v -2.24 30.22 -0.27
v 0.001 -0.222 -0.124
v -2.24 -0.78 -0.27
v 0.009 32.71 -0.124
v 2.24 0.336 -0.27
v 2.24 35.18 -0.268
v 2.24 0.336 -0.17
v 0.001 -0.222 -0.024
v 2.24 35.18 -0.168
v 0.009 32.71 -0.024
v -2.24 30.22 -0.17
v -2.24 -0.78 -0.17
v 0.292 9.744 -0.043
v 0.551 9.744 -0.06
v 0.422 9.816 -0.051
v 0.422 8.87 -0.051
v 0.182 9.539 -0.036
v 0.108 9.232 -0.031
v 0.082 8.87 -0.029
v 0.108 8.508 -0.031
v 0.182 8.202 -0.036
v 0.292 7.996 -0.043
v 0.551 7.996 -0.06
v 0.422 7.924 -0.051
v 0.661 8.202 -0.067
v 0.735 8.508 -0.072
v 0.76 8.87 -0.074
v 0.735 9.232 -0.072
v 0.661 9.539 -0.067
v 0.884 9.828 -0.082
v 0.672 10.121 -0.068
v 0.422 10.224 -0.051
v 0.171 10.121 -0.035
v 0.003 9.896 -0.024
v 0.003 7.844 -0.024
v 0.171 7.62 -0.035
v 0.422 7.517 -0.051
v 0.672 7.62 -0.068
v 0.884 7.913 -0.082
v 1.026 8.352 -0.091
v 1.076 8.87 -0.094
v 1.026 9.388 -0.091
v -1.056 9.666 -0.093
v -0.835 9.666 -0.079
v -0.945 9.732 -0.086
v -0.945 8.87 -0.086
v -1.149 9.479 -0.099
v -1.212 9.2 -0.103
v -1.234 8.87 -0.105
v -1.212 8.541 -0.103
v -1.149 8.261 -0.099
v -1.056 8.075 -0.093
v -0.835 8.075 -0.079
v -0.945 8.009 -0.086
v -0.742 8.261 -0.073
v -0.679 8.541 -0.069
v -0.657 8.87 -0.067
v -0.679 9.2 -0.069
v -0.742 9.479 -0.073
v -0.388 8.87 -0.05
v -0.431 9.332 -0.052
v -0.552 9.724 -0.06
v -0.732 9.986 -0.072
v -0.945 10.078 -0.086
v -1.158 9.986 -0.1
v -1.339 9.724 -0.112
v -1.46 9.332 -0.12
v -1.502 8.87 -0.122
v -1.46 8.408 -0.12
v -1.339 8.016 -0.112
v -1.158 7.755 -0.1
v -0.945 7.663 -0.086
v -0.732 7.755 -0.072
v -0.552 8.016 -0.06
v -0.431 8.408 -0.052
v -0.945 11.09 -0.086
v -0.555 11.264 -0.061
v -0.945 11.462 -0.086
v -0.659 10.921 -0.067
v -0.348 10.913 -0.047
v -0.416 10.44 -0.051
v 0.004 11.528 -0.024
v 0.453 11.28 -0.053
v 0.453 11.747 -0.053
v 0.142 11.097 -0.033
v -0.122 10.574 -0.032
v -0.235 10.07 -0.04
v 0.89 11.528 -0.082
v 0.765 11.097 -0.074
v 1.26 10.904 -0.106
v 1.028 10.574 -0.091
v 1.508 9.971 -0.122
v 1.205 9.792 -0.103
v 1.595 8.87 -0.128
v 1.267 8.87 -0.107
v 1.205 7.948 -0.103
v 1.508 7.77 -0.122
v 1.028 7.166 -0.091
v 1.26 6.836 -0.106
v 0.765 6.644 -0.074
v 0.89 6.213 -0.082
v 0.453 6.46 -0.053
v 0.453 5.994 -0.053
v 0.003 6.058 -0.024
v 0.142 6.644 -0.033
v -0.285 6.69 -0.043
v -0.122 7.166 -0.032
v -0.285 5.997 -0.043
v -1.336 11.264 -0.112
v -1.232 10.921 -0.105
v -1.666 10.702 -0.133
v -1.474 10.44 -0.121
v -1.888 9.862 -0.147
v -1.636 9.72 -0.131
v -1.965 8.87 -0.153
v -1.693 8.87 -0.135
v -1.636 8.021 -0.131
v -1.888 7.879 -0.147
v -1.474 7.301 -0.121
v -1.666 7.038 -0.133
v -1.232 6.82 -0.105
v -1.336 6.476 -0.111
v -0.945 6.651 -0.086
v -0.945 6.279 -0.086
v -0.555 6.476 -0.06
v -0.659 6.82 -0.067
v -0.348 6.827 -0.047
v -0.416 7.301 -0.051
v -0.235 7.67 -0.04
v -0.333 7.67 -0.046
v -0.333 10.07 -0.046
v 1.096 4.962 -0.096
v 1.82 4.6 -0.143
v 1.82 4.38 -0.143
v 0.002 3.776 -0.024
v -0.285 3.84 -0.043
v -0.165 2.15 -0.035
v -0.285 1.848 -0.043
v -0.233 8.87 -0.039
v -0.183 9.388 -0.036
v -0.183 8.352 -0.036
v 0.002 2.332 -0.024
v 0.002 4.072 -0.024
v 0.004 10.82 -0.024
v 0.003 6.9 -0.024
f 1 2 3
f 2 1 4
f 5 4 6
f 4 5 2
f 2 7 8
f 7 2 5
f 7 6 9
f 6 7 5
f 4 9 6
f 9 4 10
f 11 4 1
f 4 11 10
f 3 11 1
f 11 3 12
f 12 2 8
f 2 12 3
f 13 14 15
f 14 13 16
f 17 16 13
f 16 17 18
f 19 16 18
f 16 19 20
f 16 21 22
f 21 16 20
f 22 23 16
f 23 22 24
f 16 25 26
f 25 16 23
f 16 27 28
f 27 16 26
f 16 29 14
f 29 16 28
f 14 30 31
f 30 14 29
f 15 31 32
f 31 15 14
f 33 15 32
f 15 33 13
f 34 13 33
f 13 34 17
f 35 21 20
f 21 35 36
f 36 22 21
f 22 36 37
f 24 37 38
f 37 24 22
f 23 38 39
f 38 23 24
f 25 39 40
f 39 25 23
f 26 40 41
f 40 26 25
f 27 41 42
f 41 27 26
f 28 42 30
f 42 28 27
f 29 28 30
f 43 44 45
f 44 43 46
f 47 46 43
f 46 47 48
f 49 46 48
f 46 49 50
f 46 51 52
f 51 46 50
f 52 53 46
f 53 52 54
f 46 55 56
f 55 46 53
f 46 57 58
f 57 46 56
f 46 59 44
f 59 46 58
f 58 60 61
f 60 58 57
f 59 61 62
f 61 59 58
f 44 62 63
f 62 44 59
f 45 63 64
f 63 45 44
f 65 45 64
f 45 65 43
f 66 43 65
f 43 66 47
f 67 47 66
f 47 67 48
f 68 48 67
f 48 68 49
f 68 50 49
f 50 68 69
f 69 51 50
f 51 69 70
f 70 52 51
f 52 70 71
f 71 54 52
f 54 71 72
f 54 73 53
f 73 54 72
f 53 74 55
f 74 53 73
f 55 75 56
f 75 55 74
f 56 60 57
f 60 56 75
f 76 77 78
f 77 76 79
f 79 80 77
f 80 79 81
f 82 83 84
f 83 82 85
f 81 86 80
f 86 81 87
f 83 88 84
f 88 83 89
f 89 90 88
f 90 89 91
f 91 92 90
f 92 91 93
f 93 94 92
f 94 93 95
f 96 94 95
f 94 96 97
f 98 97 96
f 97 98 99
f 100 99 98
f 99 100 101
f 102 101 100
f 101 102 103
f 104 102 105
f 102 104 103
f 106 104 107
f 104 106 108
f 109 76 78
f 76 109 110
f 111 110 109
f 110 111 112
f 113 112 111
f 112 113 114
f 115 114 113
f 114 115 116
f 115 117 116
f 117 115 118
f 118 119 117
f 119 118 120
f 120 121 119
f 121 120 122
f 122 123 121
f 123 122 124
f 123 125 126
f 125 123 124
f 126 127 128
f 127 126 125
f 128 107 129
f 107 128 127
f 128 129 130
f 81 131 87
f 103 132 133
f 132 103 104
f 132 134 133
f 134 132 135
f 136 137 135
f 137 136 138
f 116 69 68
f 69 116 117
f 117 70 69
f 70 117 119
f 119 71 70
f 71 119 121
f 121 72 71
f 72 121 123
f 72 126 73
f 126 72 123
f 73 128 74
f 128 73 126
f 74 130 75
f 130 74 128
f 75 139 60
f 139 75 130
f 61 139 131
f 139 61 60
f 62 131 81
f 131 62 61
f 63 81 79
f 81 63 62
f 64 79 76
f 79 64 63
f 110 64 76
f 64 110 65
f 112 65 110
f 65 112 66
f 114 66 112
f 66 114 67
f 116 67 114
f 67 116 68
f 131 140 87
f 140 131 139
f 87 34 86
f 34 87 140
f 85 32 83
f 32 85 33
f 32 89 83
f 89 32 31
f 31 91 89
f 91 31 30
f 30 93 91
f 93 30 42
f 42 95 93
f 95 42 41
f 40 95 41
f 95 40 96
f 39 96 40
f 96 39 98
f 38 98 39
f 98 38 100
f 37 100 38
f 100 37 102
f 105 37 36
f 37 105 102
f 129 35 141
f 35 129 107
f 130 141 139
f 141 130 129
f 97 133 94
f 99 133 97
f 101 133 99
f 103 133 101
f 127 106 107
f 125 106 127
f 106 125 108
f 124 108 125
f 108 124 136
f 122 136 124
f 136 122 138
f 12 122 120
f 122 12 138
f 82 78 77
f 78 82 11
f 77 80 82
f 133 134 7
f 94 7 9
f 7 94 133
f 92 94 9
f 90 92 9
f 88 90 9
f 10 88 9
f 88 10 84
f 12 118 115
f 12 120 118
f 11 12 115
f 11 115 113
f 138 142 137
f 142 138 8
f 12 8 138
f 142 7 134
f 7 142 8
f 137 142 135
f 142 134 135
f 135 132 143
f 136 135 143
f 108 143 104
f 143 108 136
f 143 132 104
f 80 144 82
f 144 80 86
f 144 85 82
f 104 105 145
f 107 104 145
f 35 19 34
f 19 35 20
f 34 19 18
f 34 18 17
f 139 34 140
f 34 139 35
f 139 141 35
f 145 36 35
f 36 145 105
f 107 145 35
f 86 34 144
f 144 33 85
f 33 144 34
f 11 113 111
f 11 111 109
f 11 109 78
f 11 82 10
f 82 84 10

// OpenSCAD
use <../lib.scad>
function ldraw_lib__4125165fc01() = [
// 0 Sticker  0.6 x  4.5 Trapezoid with White "v8" on Left Side on Red Background (Formed)
// 0 Name: 4125165fc01.dat
// 0 Author: Philippe Hurbain [Philo]
// 0 !LDRAW_ORG Part UPDATE 2019-03
// 0 !LICENSE Licensed under CC BY 4.0 : see CAreadme.txt
// 
// 0 BFC CERTIFY CCW
  [0,"BFC","CERTIFY"],
  [0,"BFC","CCW"],
// 
// 0 !KEYWORDS Set 8448
// 
// 0 !HISTORY 2019-12-27 [PTadmin] Official Update 2019-03
// 
// 
// 4 16 -5.6 0.6762 -1.95 -5.6 0.6755 75.55 0.0228 0.3101 81.7753 0.0023 0.31 -0.5544
  [4,16,-5.6,0.6762,-1.95,-5.6,0.6755,75.55,0.0228,0.3101,81.7753,0.0023,0.31,-0.5544],
// 4 16 5.6 0.6762 0.84 0.0023 0.31 -0.5544 0.0228 0.3101 81.7753 5.6 0.6712 87.95
  [4,16,5.6,0.6762,0.84,0.0023,0.31,-0.5544,0.0228,0.3101,81.7753,5.6,0.6712,87.95],
// 
// 4 16 0.0023 0.31 -0.5544 5.6 0.6762 0.84 5.6 0.4262 0.84 0.0024 0.06 -0.5544
  [4,16,0.0023,0.31,-0.5544,5.6,0.6762,0.84,5.6,0.4262,0.84,0.0024,0.06,-0.5544],
// 4 16 5.6 0.6762 0.84 5.6 0.6712 87.95 5.6 0.4212 87.95 5.6 0.4262 0.84
  [4,16,5.6,0.6762,0.84,5.6,0.6712,87.95,5.6,0.4212,87.95,5.6,0.4262,0.84],
// 4 16 5.6 0.6712 87.95 0.0228 0.3101 81.7753 0.0228 0.0601 81.7753 5.6 0.4212 87.95
  [4,16,5.6,0.6712,87.95,0.0228,0.3101,81.7753,0.0228,0.0601,81.7753,5.6,0.4212,87.95],
// 4 16 0.0228 0.3101 81.7753 -5.6 0.6755 75.55 -5.6 0.4255 75.55 0.0228 0.0601 81.7753
  [4,16,0.0228,0.3101,81.7753,-5.6,0.6755,75.55,-5.6,0.4255,75.55,0.0228,0.0601,81.7753],
// 4 16 -5.6 0.6755 75.55 -5.6 0.6762 -1.95 -5.6 0.4262 -1.95 -5.6 0.4255 75.55
  [4,16,-5.6,0.6755,75.55,-5.6,0.6762,-1.95,-5.6,0.4262,-1.95,-5.6,0.4255,75.55],
// 4 16 -5.6 0.6762 -1.95 0.0023 0.31 -0.5544 0.0024 0.06 -0.5544 -5.6 0.4262 -1.95
  [4,16,-5.6,0.6762,-1.95,0.0023,0.31,-0.5544,0.0024,0.06,-0.5544,-5.6,0.4262,-1.95],
// 
// 4 4 1.054 0.1285 22.176 1.378 0.1496 24.36 1.054 0.1284 24.54 0.729 0.1072 24.36
  [4,4,1.054,0.1285,22.176,1.378,0.1496,24.36,1.054,0.1284,24.54,0.729,0.1072,24.36],
// 4 4 1.054 0.1285 22.176 0.729 0.1072 24.36 0.454 0.0892 23.848 0.271 0.0772 23.081
  [4,4,1.054,0.1285,22.176,0.729,0.1072,24.36,0.454,0.0892,23.848,0.271,0.0772,23.081],
// 4 4 1.054 0.1285 22.176 0.271 0.0772 23.081 0.206 0.073 22.176 0.271 0.0773 21.271
  [4,4,1.054,0.1285,22.176,0.271,0.0772,23.081,0.206,0.073,22.176,0.271,0.0773,21.271],
// 4 4 1.054 0.1285 22.176 0.271 0.0773 21.271 0.454 0.0892 20.504 0.729 0.1072 19.991
  [4,4,1.054,0.1285,22.176,0.271,0.0773,21.271,0.454,0.0892,20.504,0.729,0.1072,19.991],
// 4 4 1.054 0.1285 22.176 0.729 0.1072 19.991 1.054 0.1285 19.811 1.378 0.1497 19.991
  [4,4,1.054,0.1285,22.176,0.729,0.1072,19.991,1.054,0.1285,19.811,1.378,0.1497,19.991],
// 4 4 1.054 0.1285 22.176 1.378 0.1497 19.991 1.653 0.1677 20.504 1.837 0.1797 21.271
  [4,4,1.054,0.1285,22.176,1.378,0.1497,19.991,1.653,0.1677,20.504,1.837,0.1797,21.271],
// 4 4 1.054 0.1285 22.176 1.837 0.1797 21.271 1.901 0.1839 22.176 1.837 0.1797 23.081
  [4,4,1.054,0.1285,22.176,1.837,0.1797,21.271,1.901,0.1839,22.176,1.837,0.1797,23.081],
// 4 4 1.054 0.1285 22.176 1.837 0.1797 23.081 1.653 0.1676 23.848 1.378 0.1496 24.36
  [4,4,1.054,0.1285,22.176,1.837,0.1797,23.081,1.653,0.1676,23.848,1.378,0.1496,24.36],
// 4 15 1.653 0.1676 23.848 2.21 0.2041 24.569 1.68 0.1694 25.302 1.378 0.1496 24.36
  [4,15,1.653,0.1676,23.848,2.21,0.2041,24.569,1.68,0.1694,25.302,1.378,0.1496,24.36],
// 4 15 1.378 0.1496 24.36 1.68 0.1694 25.302 1.054 0.1284 25.56 1.054 0.1284 24.54
  [4,15,1.378,0.1496,24.36,1.68,0.1694,25.302,1.054,0.1284,25.56,1.054,0.1284,24.54],
// 4 15 1.054 0.1284 24.54 1.054 0.1284 25.56 0.428 0.0875 25.302 0.729 0.1072 24.36
  [4,15,1.054,0.1284,24.54,1.054,0.1284,25.56,0.428,0.0875,25.302,0.729,0.1072,24.36],
// 4 15 0.729 0.1072 24.36 0.428 0.0875 25.302 0.0086 0.06 24.74 0.454 0.0892 23.848
  [4,15,0.729,0.1072,24.36,0.428,0.0875,25.302,0.0086,0.06,24.74,0.454,0.0892,23.848],
// 4 15 0.454 0.0892 20.504 0.271 0.0773 21.271 0.0074 0.06 19.61 0.428 0.0876 19.049
  [4,15,0.454,0.0892,20.504,0.271,0.0773,21.271,0.0074,0.06,19.61,0.428,0.0876,19.049],
// 4 15 0.729 0.1072 19.991 0.454 0.0892 20.504 0.428 0.0876 19.049 1.054 0.1285 18.792
  [4,15,0.729,0.1072,19.991,0.454,0.0892,20.504,0.428,0.0876,19.049,1.054,0.1285,18.792],
// 4 15 1.054 0.1285 19.811 0.729 0.1072 19.991 1.054 0.1285 18.792 1.68 0.1695 19.049
  [4,15,1.054,0.1285,19.811,0.729,0.1072,19.991,1.054,0.1285,18.792,1.68,0.1695,19.049],
// 4 15 1.378 0.1497 19.991 1.054 0.1285 19.811 1.68 0.1695 19.049 2.21 0.2041 19.783
  [4,15,1.378,0.1497,19.991,1.054,0.1285,19.811,1.68,0.1695,19.049,2.21,0.2041,19.783],
// 4 15 1.653 0.1677 20.504 1.378 0.1497 19.991 2.21 0.2041 19.783 2.565 0.2273 20.881
  [4,15,1.653,0.1677,20.504,1.378,0.1497,19.991,2.21,0.2041,19.783,2.565,0.2273,20.881],
// 4 15 1.837 0.1797 21.271 1.653 0.1677 20.504 2.565 0.2273 20.881 2.689 0.2354 22.176
  [4,15,1.837,0.1797,21.271,1.653,0.1677,20.504,2.565,0.2273,20.881,2.689,0.2354,22.176],
// 4 15 1.901 0.1839 22.176 1.837 0.1797 21.271 2.689 0.2354 22.176 2.565 0.2273 23.471
  [4,15,1.901,0.1839,22.176,1.837,0.1797,21.271,2.689,0.2354,22.176,2.565,0.2273,23.471],
// 4 15 1.837 0.1797 23.081 1.901 0.1839 22.176 2.565 0.2273 23.471 2.21 0.2041 24.569
  [4,15,1.837,0.1797,23.081,1.901,0.1839,22.176,2.565,0.2273,23.471,2.21,0.2041,24.569],
// 3 15 1.653 0.1676 23.848 1.837 0.1797 23.081 2.21 0.2041 24.569
  [3,15,1.653,0.1676,23.848,1.837,0.1797,23.081,2.21,0.2041,24.569],
// 4 4 -2.363 0.215 22.176 -2.087 0.197 24.165 -2.363 0.2151 24.329 -2.639 0.2331 24.165
  [4,4,-2.363,0.215,22.176,-2.087,0.197,24.165,-2.363,0.2151,24.329,-2.639,0.2331,24.165],
// 4 4 -2.363 0.215 22.176 -2.639 0.2331 24.165 -2.873 0.2484 23.698 -3.029 0.2586 23
  [4,4,-2.363,0.215,22.176,-2.639,0.2331,24.165,-2.873,0.2484,23.698,-3.029,0.2586,23],
// 4 4 -2.363 0.215 22.176 -3.029 0.2586 23 -3.084 0.2621 22.176 -3.029 0.2585 21.352
  [4,4,-2.363,0.215,22.176,-3.029,0.2586,23,-3.084,0.2621,22.176,-3.029,0.2585,21.352],
// 4 4 -2.363 0.215 22.176 -3.029 0.2585 21.352 -2.873 0.2483 20.653 -2.639 0.233 20.187
  [4,4,-2.363,0.215,22.176,-3.029,0.2585,21.352,-2.873,0.2483,20.653,-2.639,0.233,20.187],
// 4 4 -2.363 0.215 22.176 -2.639 0.233 20.187 -2.363 0.215 20.023 -2.087 0.1969 20.187
  [4,4,-2.363,0.215,22.176,-2.639,0.233,20.187,-2.363,0.215,20.023,-2.087,0.1969,20.187],
// 4 4 -2.363 0.215 22.176 -2.087 0.1969 20.187 -1.854 0.1817 20.653 -1.697 0.1715 21.352
  [4,4,-2.363,0.215,22.176,-2.087,0.1969,20.187,-1.854,0.1817,20.653,-1.697,0.1715,21.352],
// 4 4 -2.363 0.215 22.176 -1.697 0.1715 21.352 -1.643 0.168 22.176 -1.697 0.1715 23
  [4,4,-2.363,0.215,22.176,-1.697,0.1715,21.352,-1.643,0.168,22.176,-1.697,0.1715,23],
// 4 4 -2.363 0.215 22.176 -1.697 0.1715 23 -1.854 0.1818 23.698 -2.087 0.197 24.165
  [4,4,-2.363,0.215,22.176,-1.697,0.1715,23,-1.854,0.1818,23.698,-2.087,0.197,24.165],
// 4 15 -1.697 0.1715 23 -1.643 0.168 22.176 -0.971 0.124 22.176 -1.077 0.131 23.331
  [4,15,-1.697,0.1715,23,-1.643,0.168,22.176,-0.971,0.124,22.176,-1.077,0.131,23.331],
// 4 15 -1.854 0.1818 23.698 -1.697 0.1715 23 -1.077 0.131 23.331 -1.379 0.1507 24.31
  [4,15,-1.854,0.1818,23.698,-1.697,0.1715,23,-1.077,0.131,23.331,-1.379,0.1507,24.31],
// 4 15 -2.087 0.197 24.165 -1.854 0.1818 23.698 -1.379 0.1507 24.31 -1.83 0.1802 24.964
  [4,15,-2.087,0.197,24.165,-1.854,0.1818,23.698,-1.379,0.1507,24.31,-1.83,0.1802,24.964],
// 4 15 -2.363 0.2151 24.329 -2.087 0.197 24.165 -1.83 0.1802 24.964 -2.363 0.2151 25.194
  [4,15,-2.363,0.2151,24.329,-2.087,0.197,24.165,-1.83,0.1802,24.964,-2.363,0.2151,25.194],
// 4 15 -2.639 0.2331 24.165 -2.363 0.2151 24.329 -2.363 0.2151 25.194 -2.896 0.2499 24.964
  [4,15,-2.639,0.2331,24.165,-2.363,0.2151,24.329,-2.363,0.2151,25.194,-2.896,0.2499,24.964],
// 4 15 -2.873 0.2484 23.698 -2.639 0.2331 24.165 -2.896 0.2499 24.964 -3.348 0.2794 24.31
  [4,15,-2.873,0.2484,23.698,-2.639,0.2331,24.165,-2.896,0.2499,24.964,-3.348,0.2794,24.31],
// 4 15 -3.029 0.2586 23 -2.873 0.2484 23.698 -3.348 0.2794 24.31 -3.65 0.2992 23.331
  [4,15,-3.029,0.2586,23,-2.873,0.2484,23.698,-3.348,0.2794,24.31,-3.65,0.2992,23.331],
// 4 15 -3.084 0.2621 22.176 -3.029 0.2586 23 -3.65 0.2992 23.331 -3.756 0.3061 22.176
  [4,15,-3.084,0.2621,22.176,-3.029,0.2586,23,-3.65,0.2992,23.331,-3.756,0.3061,22.176],
// 4 15 -3.029 0.2585 21.352 -3.084 0.2621 22.176 -3.756 0.3061 22.176 -3.65 0.2991 21.021
  [4,15,-3.029,0.2585,21.352,-3.084,0.2621,22.176,-3.756,0.3061,22.176,-3.65,0.2991,21.021],
// 4 15 -2.873 0.2483 20.653 -3.029 0.2585 21.352 -3.65 0.2991 21.021 -3.348 0.2794 20.041
  [4,15,-2.873,0.2483,20.653,-3.029,0.2585,21.352,-3.65,0.2991,21.021,-3.348,0.2794,20.041],
// 4 15 -2.639 0.233 20.187 -2.873 0.2483 20.653 -3.348 0.2794 20.041 -2.896 0.2498 19.387
  [4,15,-2.639,0.233,20.187,-2.873,0.2483,20.653,-3.348,0.2794,20.041,-2.896,0.2498,19.387],
// 4 15 -2.363 0.215 20.023 -2.639 0.233 20.187 -2.896 0.2498 19.387 -2.363 0.215 19.157
  [4,15,-2.363,0.215,20.023,-2.639,0.233,20.187,-2.896,0.2498,19.387,-2.363,0.215,19.157],
// 4 15 -2.087 0.1969 20.187 -2.363 0.215 20.023 -2.363 0.215 19.157 -1.83 0.1801 19.387
  [4,15,-2.087,0.1969,20.187,-2.363,0.215,20.023,-2.363,0.215,19.157,-1.83,0.1801,19.387],
// 4 15 -1.854 0.1817 20.653 -2.087 0.1969 20.187 -1.83 0.1801 19.387 -1.379 0.1507 20.041
  [4,15,-1.854,0.1817,20.653,-2.087,0.1969,20.187,-1.83,0.1801,19.387,-1.379,0.1507,20.041],
// 4 15 -1.697 0.1715 21.352 -1.854 0.1817 20.653 -1.379 0.1507 20.041 -1.077 0.1309 21.021
  [4,15,-1.697,0.1715,21.352,-1.854,0.1817,20.653,-1.379,0.1507,20.041,-1.077,0.1309,21.021],
// 4 15 -1.643 0.168 22.176 -1.697 0.1715 21.352 -1.077 0.1309 21.021 -0.971 0.124 22.176
  [4,15,-1.643,0.168,22.176,-1.697,0.1715,21.352,-1.077,0.1309,21.021,-0.971,0.124,22.176],
// 4 15 -1.387 0.1513 28.16 -2.363 0.2151 28.654 -2.363 0.2151 27.724 -1.648 0.1684 27.302
  [4,15,-1.387,0.1513,28.16,-2.363,0.2151,28.654,-2.363,0.2151,27.724,-1.648,0.1684,27.302],
// 4 15 -0.871 0.1176 27.283 -1.387 0.1513 28.16 -1.648 0.1684 27.302 -1.041 0.1287 26.099
  [4,15,-0.871,0.1176,27.283,-1.387,0.1513,28.16,-1.648,0.1684,27.302,-1.041,0.1287,26.099],
// 4 15 1.133 0.1335 28.201 1.133 0.1335 29.367 0.0097 0.06 28.82 0.355 0.0827 27.742
  [4,15,1.133,0.1335,28.201,1.133,0.1335,29.367,0.0097,0.06,28.82,0.355,0.0827,27.742],
// 4 15 -0.304 0.0805 26.436 -0.871 0.1176 27.283 -1.041 0.1287 26.099 -0.588 0.099 25.175
  [4,15,-0.304,0.0805,26.436,-0.871,0.1176,27.283,-1.041,0.1287,26.099,-0.588,0.099,25.175],
// 4 15 2.225 0.205 28.82 1.133 0.1335 29.367 1.133 0.1335 28.201 1.912 0.1845 27.742
  [4,15,2.225,0.205,28.82,1.133,0.1335,29.367,1.133,0.1335,28.201,1.912,0.1845,27.742],
// 4 15 3.151 0.2656 27.261 2.225 0.205 28.82 1.912 0.1845 27.742 2.571 0.2276 26.436
  [4,15,3.151,0.2656,27.261,2.225,0.205,28.82,1.912,0.1845,27.742,2.571,0.2276,26.436],
// 4 15 3.77 0.3061 24.928 3.151 0.2656 27.261 2.571 0.2276 26.436 3.012 0.2565 24.481
  [4,15,3.77,0.3061,24.928,3.151,0.2656,27.261,2.571,0.2276,26.436,3.012,0.2565,24.481],
// 4 15 3.987 0.3203 22.176 3.77 0.3061 24.928 3.012 0.2565 24.481 3.167 0.2667 22.176
  [4,15,3.987,0.3203,22.176,3.77,0.3061,24.928,3.012,0.2565,24.481,3.167,0.2667,22.176],
// 4 15 3.77 0.3062 19.424 3.987 0.3203 22.176 3.167 0.2667 22.176 3.012 0.2566 19.87
  [4,15,3.77,0.3062,19.424,3.987,0.3203,22.176,3.167,0.2667,22.176,3.012,0.2566,19.87],
// 4 15 3.151 0.2657 17.091 3.77 0.3062 19.424 3.012 0.2566 19.87 2.571 0.2278 17.915
  [4,15,3.151,0.2657,17.091,3.77,0.3062,19.424,3.012,0.2566,19.87,2.571,0.2278,17.915],
// 4 15 2.225 0.2052 15.532 3.151 0.2657 17.091 2.571 0.2278 17.915 1.912 0.1847 16.609
  [4,15,2.225,0.2052,15.532,3.151,0.2657,17.091,2.571,0.2278,17.915,1.912,0.1847,16.609],
// 4 15 1.133 0.1337 14.984 2.225 0.2052 15.532 1.912 0.1847 16.609 1.133 0.1337 16.151
  [4,15,1.133,0.1337,14.984,2.225,0.2052,15.532,1.912,0.1847,16.609,1.133,0.1337,16.151],
// 4 15 0.0063 0.06 15.144 1.133 0.1337 14.984 1.133 0.1337 16.151 0.355 0.0828 16.609
  [4,15,0.0063,0.06,15.144,1.133,0.1337,14.984,1.133,0.1337,16.151,0.355,0.0828,16.609],
// 4 15 0.0063 0.06 15.144 -0.304 0.0804 17.915 -0.712 0.107 16.726 -0.712 0.107 14.992
  [4,15,0.0063,0.06,15.144,-0.304,0.0804,17.915,-0.712,0.107,16.726,-0.712,0.107,14.992],
// 4 15 -2.363 0.2151 27.724 -2.363 0.2151 28.654 -3.339 0.2789 28.16 -3.079 0.2619 27.302
  [4,15,-2.363,0.2151,27.724,-2.363,0.2151,28.654,-3.339,0.2789,28.16,-3.079,0.2619,27.302],
// 4 15 -3.079 0.2619 27.302 -3.339 0.2789 28.16 -4.166 0.3328 26.756 -3.685 0.3015 26.099
  [4,15,-3.079,0.2619,27.302,-3.339,0.2789,28.16,-4.166,0.3328,26.756,-3.685,0.3015,26.099],
// 4 15 -3.685 0.3015 26.099 -4.166 0.3328 26.756 -4.719 0.3687 24.655 -4.091 0.3279 24.299
  [4,15,-3.685,0.3015,26.099,-4.166,0.3328,26.756,-4.719,0.3687,24.655,-4.091,0.3279,24.299],
// 4 15 -4.091 0.3279 24.299 -4.719 0.3687 24.655 -4.913 0.3813 22.176 -4.233 0.3371 22.176
  [4,15,-4.091,0.3279,24.299,-4.719,0.3687,24.655,-4.913,0.3813,22.176,-4.233,0.3371,22.176],
// 4 15 -4.233 0.3371 22.176 -4.913 0.3813 22.176 -4.719 0.3687 19.697 -4.091 0.3279 20.052
  [4,15,-4.233,0.3371,22.176,-4.913,0.3813,22.176,-4.719,0.3687,19.697,-4.091,0.3279,20.052],
// 4 15 -4.091 0.3279 20.052 -4.719 0.3687 19.697 -4.166 0.3328 17.595 -3.685 0.3014 18.252
  [4,15,-4.091,0.3279,20.052,-4.719,0.3687,19.697,-4.166,0.3328,17.595,-3.685,0.3014,18.252],
// 4 15 -3.685 0.3014 18.252 -4.166 0.3328 17.595 -3.339 0.2787 16.191 -3.079 0.2617 17.05
  [4,15,-3.685,0.3014,18.252,-4.166,0.3328,17.595,-3.339,0.2787,16.191,-3.079,0.2617,17.05],
// 4 15 -3.079 0.2617 17.05 -3.339 0.2787 16.191 -2.363 0.2149 15.698 -2.363 0.2149 16.627
  [4,15,-3.079,0.2617,17.05,-3.339,0.2787,16.191,-2.363,0.2149,15.698,-2.363,0.2149,16.627],
// 4 15 -2.363 0.2149 16.627 -2.363 0.2149 15.698 -1.387 0.1511 16.191 -1.648 0.1682 17.05
  [4,15,-2.363,0.2149,16.627,-2.363,0.2149,15.698,-1.387,0.1511,16.191,-1.648,0.1682,17.05],
// 4 15 -1.648 0.1682 17.05 -1.387 0.1511 16.191 -0.871 0.1174 17.068 -1.041 0.1285 18.252
  [4,15,-1.648,0.1682,17.05,-1.387,0.1511,16.191,-0.871,0.1174,17.068,-1.041,0.1285,18.252],
// 4 15 -1.041 0.1285 18.252 -0.871 0.1174 17.068 -0.304 0.0804 17.915 -0.588 0.0989 19.176
  [4,15,-1.041,0.1285,18.252,-0.871,0.1174,17.068,-0.304,0.0804,17.915,-0.588,0.0989,19.176],
// 3 15 -1.041 0.1285 18.252 -0.588 0.0989 19.176 -0.833 0.115 19.176
  [3,15,-1.041,0.1285,18.252,-0.588,0.0989,19.176,-0.833,0.115,19.176],
// 3 15 -1.041 0.1287 26.099 -0.833 0.1151 25.175 -0.588 0.099 25.175
  [3,15,-1.041,0.1287,26.099,-0.833,0.1151,25.175,-0.588,0.099,25.175],
// 4 15 1.133 0.1337 14.984 0.0063 0.06 15.144 2.739 0.2388 12.405 4.55 0.3573 11.499
  [4,15,1.133,0.1337,14.984,0.0063,0.06,15.144,2.739,0.2388,12.405,4.55,0.3573,11.499],
// 4 15 4.55 0.3573 10.949 4.55 0.3573 11.499 2.739 0.2388 12.405 0.0048 0.06 9.441
  [4,15,4.55,0.3573,10.949,4.55,0.3573,11.499,2.739,0.2388,12.405,0.0048,0.06,9.441],
// 4 15 -0.712 0.1068 4.62 -0.413 0.0873 5.374 0.0048 0.06 9.441 -0.712 0.1069 9.601
  [4,15,-0.712,0.1068,4.62,-0.413,0.0873,5.374,0.0048,0.06,9.441,-0.712,0.1069,9.601],
// 4 4 -3.65 0.2991 21.021 -3.756 0.3061 22.176 -4.233 0.3371 22.176 -4.091 0.3279 20.052
  [4,4,-3.65,0.2991,21.021,-3.756,0.3061,22.176,-4.233,0.3371,22.176,-4.091,0.3279,20.052],
// 4 4 -3.348 0.2794 20.041 -3.65 0.2991 21.021 -4.091 0.3279 20.052 -3.685 0.3014 18.252
  [4,4,-3.348,0.2794,20.041,-3.65,0.2991,21.021,-4.091,0.3279,20.052,-3.685,0.3014,18.252],
// 4 4 -2.896 0.2498 19.387 -3.348 0.2794 20.041 -3.685 0.3014 18.252 -3.079 0.2617 17.05
  [4,4,-2.896,0.2498,19.387,-3.348,0.2794,20.041,-3.685,0.3014,18.252,-3.079,0.2617,17.05],
// 4 4 -2.363 0.215 19.157 -2.896 0.2498 19.387 -3.079 0.2617 17.05 -2.363 0.2149 16.627
  [4,4,-2.363,0.215,19.157,-2.896,0.2498,19.387,-3.079,0.2617,17.05,-2.363,0.2149,16.627],
// 4 4 -1.83 0.1801 19.387 -2.363 0.215 19.157 -2.363 0.2149 16.627 -1.648 0.1682 17.05
  [4,4,-1.83,0.1801,19.387,-2.363,0.215,19.157,-2.363,0.2149,16.627,-1.648,0.1682,17.05],
// 4 4 -1.379 0.1507 20.041 -1.83 0.1801 19.387 -1.648 0.1682 17.05 -1.041 0.1285 18.252
  [4,4,-1.379,0.1507,20.041,-1.83,0.1801,19.387,-1.648,0.1682,17.05,-1.041,0.1285,18.252],
// 4 4 -1.077 0.1309 21.021 -1.379 0.1507 20.041 -1.041 0.1285 18.252 -0.833 0.115 19.176
  [4,4,-1.077,0.1309,21.021,-1.379,0.1507,20.041,-1.041,0.1285,18.252,-0.833,0.115,19.176],
// 4 4 -0.971 0.124 22.176 -1.077 0.1309 21.021 -0.833 0.115 19.176 -0.582 0.0986 22.176
  [4,4,-0.971,0.124,22.176,-1.077,0.1309,21.021,-0.833,0.115,19.176,-0.582,0.0986,22.176],
// 4 4 -0.971 0.124 22.176 -0.582 0.0986 22.176 -0.833 0.1151 25.175 -1.077 0.131 23.331
  [4,4,-0.971,0.124,22.176,-0.582,0.0986,22.176,-0.833,0.1151,25.175,-1.077,0.131,23.331],
// 4 4 -1.077 0.131 23.331 -0.833 0.1151 25.175 -1.041 0.1287 26.099 -1.379 0.1507 24.31
  [4,4,-1.077,0.131,23.331,-0.833,0.1151,25.175,-1.041,0.1287,26.099,-1.379,0.1507,24.31],
// 4 4 -1.379 0.1507 24.31 -1.041 0.1287 26.099 -1.648 0.1684 27.302 -1.83 0.1802 24.964
  [4,4,-1.379,0.1507,24.31,-1.041,0.1287,26.099,-1.648,0.1684,27.302,-1.83,0.1802,24.964],
// 4 4 -1.83 0.1802 24.964 -1.648 0.1684 27.302 -2.363 0.2151 27.724 -2.363 0.2151 25.194
  [4,4,-1.83,0.1802,24.964,-1.648,0.1684,27.302,-2.363,0.2151,27.724,-2.363,0.2151,25.194],
// 4 4 -2.363 0.2151 25.194 -2.363 0.2151 27.724 -3.079 0.2619 27.302 -2.896 0.2499 24.964
  [4,4,-2.363,0.2151,25.194,-2.363,0.2151,27.724,-3.079,0.2619,27.302,-2.896,0.2499,24.964],
// 4 4 -2.896 0.2499 24.964 -3.079 0.2619 27.302 -3.685 0.3015 26.099 -3.348 0.2794 24.31
  [4,4,-2.896,0.2499,24.964,-3.079,0.2619,27.302,-3.685,0.3015,26.099,-3.348,0.2794,24.31],
// 4 4 -3.348 0.2794 24.31 -3.685 0.3015 26.099 -4.091 0.3279 24.299 -3.65 0.2992 23.331
  [4,4,-3.348,0.2794,24.31,-3.685,0.3015,26.099,-4.091,0.3279,24.299,-3.65,0.2992,23.331],
// 4 4 -3.65 0.2992 23.331 -4.091 0.3279 24.299 -4.233 0.3371 22.176 -3.756 0.3061 22.176
  [4,4,-3.65,0.2992,23.331,-4.091,0.3279,24.299,-4.233,0.3371,22.176,-3.756,0.3061,22.176],
// 4 4 -0.833 0.1151 25.175 -0.582 0.0986 22.176 -0.458 0.0905 23.471 -0.588 0.099 25.175
  [4,4,-0.833,0.1151,25.175,-0.582,0.0986,22.176,-0.458,0.0905,23.471,-0.588,0.099,25.175],
// 4 4 -0.588 0.099 25.175 -0.458 0.0905 23.471 0.0086 0.06 24.74 -0.304 0.0805 26.436
  [4,4,-0.588,0.099,25.175,-0.458,0.0905,23.471,0.0086,0.06,24.74,-0.304,0.0805,26.436],
// 4 4 0.355 0.0827 27.742 0.428 0.0875 25.302 1.054 0.1284 25.56 1.133 0.1335 28.201
  [4,4,0.355,0.0827,27.742,0.428,0.0875,25.302,1.054,0.1284,25.56,1.133,0.1335,28.201],
// 4 4 1.133 0.1335 28.201 1.054 0.1284 25.56 1.68 0.1694 25.302 1.912 0.1845 27.742
  [4,4,1.133,0.1335,28.201,1.054,0.1284,25.56,1.68,0.1694,25.302,1.912,0.1845,27.742],
// 4 4 1.912 0.1845 27.742 1.68 0.1694 25.302 2.21 0.2041 24.569 2.571 0.2276 26.436
  [4,4,1.912,0.1845,27.742,1.68,0.1694,25.302,2.21,0.2041,24.569,2.571,0.2276,26.436],
// 4 4 2.571 0.2276 26.436 2.21 0.2041 24.569 2.565 0.2273 23.471 3.012 0.2565 24.481
  [4,4,2.571,0.2276,26.436,2.21,0.2041,24.569,2.565,0.2273,23.471,3.012,0.2565,24.481],
// 4 4 3.012 0.2565 24.481 2.565 0.2273 23.471 2.689 0.2354 22.176 3.167 0.2667 22.176
  [4,4,3.012,0.2565,24.481,2.565,0.2273,23.471,2.689,0.2354,22.176,3.167,0.2667,22.176],
// 4 4 3.012 0.2566 19.87 3.167 0.2667 22.176 2.689 0.2354 22.176 2.565 0.2273 20.881
  [4,4,3.012,0.2566,19.87,3.167,0.2667,22.176,2.689,0.2354,22.176,2.565,0.2273,20.881],
// 4 4 2.571 0.2278 17.915 3.012 0.2566 19.87 2.565 0.2273 20.881 2.21 0.2041 19.783
  [4,4,2.571,0.2278,17.915,3.012,0.2566,19.87,2.565,0.2273,20.881,2.21,0.2041,19.783],
// 4 4 1.912 0.1847 16.609 2.571 0.2278 17.915 2.21 0.2041 19.783 1.68 0.1695 19.049
  [4,4,1.912,0.1847,16.609,2.571,0.2278,17.915,2.21,0.2041,19.783,1.68,0.1695,19.049],
// 4 4 1.133 0.1337 16.151 1.912 0.1847 16.609 1.68 0.1695 19.049 1.054 0.1285 18.792
  [4,4,1.133,0.1337,16.151,1.912,0.1847,16.609,1.68,0.1695,19.049,1.054,0.1285,18.792],
// 4 4 0.355 0.0828 16.609 1.133 0.1337 16.151 1.054 0.1285 18.792 0.428 0.0876 19.049
  [4,4,0.355,0.0828,16.609,1.133,0.1337,16.151,1.054,0.1285,18.792,0.428,0.0876,19.049],
// 4 4 -0.588 0.0989 19.176 -0.304 0.0804 17.915 0.0074 0.06 19.61 -0.458 0.0905 20.881
  [4,4,-0.588,0.0989,19.176,-0.304,0.0804,17.915,0.0074,0.06,19.61,-0.458,0.0905,20.881],
// 4 4 -0.833 0.115 19.176 -0.588 0.0989 19.176 -0.458 0.0905 20.881 -0.582 0.0986 22.176
  [4,4,-0.833,0.115,19.176,-0.588,0.0989,19.176,-0.458,0.0905,20.881,-0.582,0.0986,22.176],
// 3 4 3.77 0.3062 19.424 4.55 0.3573 11.499 3.987 0.3203 22.176
  [3,4,3.77,0.3062,19.424,4.55,0.3573,11.499,3.987,0.3203,22.176],
// 3 4 3.151 0.2657 17.091 4.55 0.3573 11.499 3.77 0.3062 19.424
  [3,4,3.151,0.2657,17.091,4.55,0.3573,11.499,3.77,0.3062,19.424],
// 3 4 2.225 0.2052 15.532 4.55 0.3573 11.499 3.151 0.2657 17.091
  [3,4,2.225,0.2052,15.532,4.55,0.3573,11.499,3.151,0.2657,17.091],
// 3 4 1.133 0.1337 14.984 4.55 0.3573 11.499 2.225 0.2052 15.532
  [3,4,1.133,0.1337,14.984,4.55,0.3573,11.499,2.225,0.2052,15.532],
// 3 15 -0.871 0.1174 17.068 -0.712 0.107 16.726 -0.304 0.0804 17.915
  [3,15,-0.871,0.1174,17.068,-0.712,0.107,16.726,-0.304,0.0804,17.915],
// 4 4 -0.712 0.107 16.726 -0.871 0.1174 17.068 -1.387 0.1511 16.191 -0.712 0.107 14.992
  [4,4,-0.712,0.107,16.726,-0.871,0.1174,17.068,-1.387,0.1511,16.191,-0.712,0.107,14.992],
// 4 4 -0.712 0.107 14.992 -1.387 0.1511 16.191 -2.363 0.2149 15.698 -0.712 0.1069 9.601
  [4,4,-0.712,0.107,14.992,-1.387,0.1511,16.191,-2.363,0.2149,15.698,-0.712,0.1069,9.601],
// 4 4 -0.712 0.1069 9.601 -2.363 0.2149 15.698 -3.339 0.2787 16.191 -0.712 0.1068 4.62
  [4,4,-0.712,0.1069,9.601,-2.363,0.2149,15.698,-3.339,0.2787,16.191,-0.712,0.1068,4.62],
// 4 4 -0.712 0.1068 4.62 -3.339 0.2787 16.191 -4.166 0.3328 17.595 -5.6 0.4262 -1.95
  [4,4,-0.712,0.1068,4.62,-3.339,0.2787,16.191,-4.166,0.3328,17.595,-5.6,0.4262,-1.95],
// 4 4 -2.363 0.2151 28.654 -1.387 0.1513 28.16 0.0097 0.06 28.82 -5.6 0.4255 75.55
  [4,4,-2.363,0.2151,28.654,-1.387,0.1513,28.16,0.0097,0.06,28.82,-5.6,0.4255,75.55],
// 3 4 -1.387 0.1513 28.16 -0.871 0.1176 27.283 0.0097 0.06 28.82
  [3,4,-1.387,0.1513,28.16,-0.871,0.1176,27.283,0.0097,0.06,28.82],
// 3 4 4.55 0.3573 11.499 4.55 0.3573 10.949 5.6 0.4262 0.84
  [3,4,4.55,0.3573,11.499,4.55,0.3573,10.949,5.6,0.4262,0.84],
// 4 4 3.987 0.3203 22.176 4.55 0.3573 11.499 5.6 0.4262 0.84 5.6 0.4212 87.95
  [4,4,3.987,0.3203,22.176,4.55,0.3573,11.499,5.6,0.4262,0.84,5.6,0.4212,87.95],
// 3 4 3.77 0.3061 24.928 3.987 0.3203 22.176 5.6 0.4212 87.95
  [3,4,3.77,0.3061,24.928,3.987,0.3203,22.176,5.6,0.4212,87.95],
// 3 4 3.151 0.2656 27.261 3.77 0.3061 24.928 5.6 0.4212 87.95
  [3,4,3.151,0.2656,27.261,3.77,0.3061,24.928,5.6,0.4212,87.95],
// 3 4 2.225 0.205 28.82 3.151 0.2656 27.261 5.6 0.4212 87.95
  [3,4,2.225,0.205,28.82,3.151,0.2656,27.261,5.6,0.4212,87.95],
// 4 4 1.133 0.1335 29.367 2.225 0.205 28.82 5.6 0.4212 87.95 0.0228 0.0601 81.7753
  [4,4,1.133,0.1335,29.367,2.225,0.205,28.82,5.6,0.4212,87.95,0.0228,0.0601,81.7753],
// 3 4 -5.6 0.4262 -1.95 -4.719 0.3687 19.697 -4.913 0.3813 22.176
  [3,4,-5.6,0.4262,-1.95,-4.719,0.3687,19.697,-4.913,0.3813,22.176],
// 3 4 -5.6 0.4262 -1.95 -4.166 0.3328 17.595 -4.719 0.3687 19.697
  [3,4,-5.6,0.4262,-1.95,-4.166,0.3328,17.595,-4.719,0.3687,19.697],
// 3 4 -5.6 0.4255 75.55 -5.6 0.4262 -1.95 -4.913 0.3813 22.176
  [3,4,-5.6,0.4255,75.55,-5.6,0.4262,-1.95,-4.913,0.3813,22.176],
// 3 4 -5.6 0.4255 75.55 -4.913 0.3813 22.176 -4.719 0.3687 24.655
  [3,4,-5.6,0.4255,75.55,-4.913,0.3813,22.176,-4.719,0.3687,24.655],
// 4 4 0.0039 0.06 5.83 -0.413 0.0873 5.374 -0.712 0.1068 4.62 0.0024 0.06 -0.5544
  [4,4,0.0039,0.06,5.83,-0.413,0.0873,5.374,-0.712,0.1068,4.62,0.0024,0.06,-0.5544],
// 3 4 -5.6 0.4262 -1.95 0.0024 0.06 -0.5544 -0.712 0.1068 4.62
  [3,4,-5.6,0.4262,-1.95,0.0024,0.06,-0.5544,-0.712,0.1068,4.62],
// 4 4 0.0024 0.06 -0.5544 5.6 0.4262 0.84 4.55 0.3573 10.949 0.0039 0.06 5.83
  [4,4,0.0024,0.06,-0.5544,5.6,0.4262,0.84,4.55,0.3573,10.949,0.0039,0.06,5.83],
// 3 15 -0.413 0.0873 5.374 0.0039 0.06 5.83 0.0048 0.06 9.441
  [3,15,-0.413,0.0873,5.374,0.0039,0.06,5.83,0.0048,0.06,9.441],
// 3 15 0.0039 0.06 5.83 4.55 0.3573 10.949 0.0048 0.06 9.441
  [3,15,0.0039,0.06,5.83,4.55,0.3573,10.949,0.0048,0.06,9.441],
// 3 15 0.0048 0.06 9.441 2.739 0.2388 12.405 0.005 0.06 10.18
  [3,15,0.0048,0.06,9.441,2.739,0.2388,12.405,0.005,0.06,10.18],
// 3 15 -0.712 0.1069 9.601 0.0048 0.06 9.441 0.005 0.06 10.18
  [3,15,-0.712,0.1069,9.601,0.0048,0.06,9.441,0.005,0.06,10.18],
// 4 4 -0.712 0.107 14.992 -0.712 0.1069 9.601 0.005 0.06 10.18 0.0063 0.06 15.144
  [4,4,-0.712,0.107,14.992,-0.712,0.1069,9.601,0.005,0.06,10.18,0.0063,0.06,15.144],
// 3 4 0.005 0.06 10.18 2.739 0.2388 12.405 0.0063 0.06 15.144
  [3,4,0.005,0.06,10.18,2.739,0.2388,12.405,0.0063,0.06,15.144],
// 4 15 -0.871 0.1176 27.283 -0.304 0.0805 26.436 0.0092 0.06 27.05 0.0097 0.06 28.82
  [4,15,-0.871,0.1176,27.283,-0.304,0.0805,26.436,0.0092,0.06,27.05,0.0097,0.06,28.82],
// 3 15 0.0092 0.06 27.05 0.355 0.0827 27.742 0.0097 0.06 28.82
  [3,15,0.0092,0.06,27.05,0.355,0.0827,27.742,0.0097,0.06,28.82],
// 3 15 0.0063 0.06 15.144 0.355 0.0828 16.609 0.0068 0.06 17.25
  [3,15,0.0063,0.06,15.144,0.355,0.0828,16.609,0.0068,0.06,17.25],
// 3 15 -0.304 0.0804 17.915 0.0063 0.06 15.144 0.0068 0.06 17.25
  [3,15,-0.304,0.0804,17.915,0.0063,0.06,15.144,0.0068,0.06,17.25],
// 4 15 0.0074 0.06 19.61 0.271 0.0773 21.271 0.206 0.073 22.176 0.0086 0.06 24.74
  [4,15,0.0074,0.06,19.61,0.271,0.0773,21.271,0.206,0.073,22.176,0.0086,0.06,24.74],
// 3 15 0.0086 0.06 24.74 0.206 0.073 22.176 0.271 0.0772 23.081
  [3,15,0.0086,0.06,24.74,0.206,0.073,22.176,0.271,0.0772,23.081],
// 3 15 0.0086 0.06 24.74 0.271 0.0772 23.081 0.454 0.0892 23.848
  [3,15,0.0086,0.06,24.74,0.271,0.0772,23.081,0.454,0.0892,23.848],
// 4 15 -0.582 0.0986 22.176 0.0074 0.06 19.61 0.0086 0.06 24.74 -0.458 0.0905 23.471
  [4,15,-0.582,0.0986,22.176,0.0074,0.06,19.61,0.0086,0.06,24.74,-0.458,0.0905,23.471],
// 3 15 -0.582 0.0986 22.176 -0.458 0.0905 20.881 0.0074 0.06 19.61
  [3,15,-0.582,0.0986,22.176,-0.458,0.0905,20.881,0.0074,0.06,19.61],
// 4 4 0.355 0.0828 16.609 0.428 0.0876 19.049 0.0074 0.06 19.61 0.0068 0.06 17.25
  [4,4,0.355,0.0828,16.609,0.428,0.0876,19.049,0.0074,0.06,19.61,0.0068,0.06,17.25],
// 3 4 -0.304 0.0804 17.915 0.0068 0.06 17.25 0.0074 0.06 19.61
  [3,4,-0.304,0.0804,17.915,0.0068,0.06,17.25,0.0074,0.06,19.61],
// 3 4 -0.304 0.0805 26.436 0.0086 0.06 24.74 0.0092 0.06 27.05
  [3,4,-0.304,0.0805,26.436,0.0086,0.06,24.74,0.0092,0.06,27.05],
// 4 4 0.0092 0.06 27.05 0.0086 0.06 24.74 0.428 0.0875 25.302 0.355 0.0827 27.742
  [4,4,0.0092,0.06,27.05,0.0086,0.06,24.74,0.428,0.0875,25.302,0.355,0.0827,27.742],
// 3 4 -5.6 0.4255 75.55 -4.719 0.3687 24.655 -4.166 0.3328 26.756
  [3,4,-5.6,0.4255,75.55,-4.719,0.3687,24.655,-4.166,0.3328,26.756],
// 3 4 -5.6 0.4255 75.55 -4.166 0.3328 26.756 -3.339 0.2789 28.16
  [3,4,-5.6,0.4255,75.55,-4.166,0.3328,26.756,-3.339,0.2789,28.16],
// 3 4 -5.6 0.4255 75.55 -3.339 0.2789 28.16 -2.363 0.2151 28.654
  [3,4,-5.6,0.4255,75.55,-3.339,0.2789,28.16,-2.363,0.2151,28.654],
// 3 4 -5.6 0.4255 75.55 0.0097 0.06 28.82 0.0228 0.0601 81.7753
  [3,4,-5.6,0.4255,75.55,0.0097,0.06,28.82,0.0228,0.0601,81.7753],
// 3 4 0.0097 0.06 28.82 1.133 0.1335 29.367 0.0228 0.0601 81.7753
  [3,4,0.0097,0.06,28.82,1.133,0.1335,29.367,0.0228,0.0601,81.7753],
// 5 4 0.0228 0.0601 81.7753 0.0024 0.06 -0.5544 5.6 0.4262 0.84 -5.6 0.4262 -1.95
  [5,4,0.0228,0.0601,81.7753,0.0024,0.06,-0.5544,5.6,0.4262,0.84,-5.6,0.4262,-1.95],
// 5 4 0.0228 0.3101 81.7753 0.0023 0.31 -0.5544 5.6 0.6762 0.84 -5.6 0.6762 -1.95
  [5,4,0.0228,0.3101,81.7753,0.0023,0.31,-0.5544,5.6,0.6762,0.84,-5.6,0.6762,-1.95],
];
module ldraw_lib__4125165fc01(step=0, col=false, unit=2/5, alt=false, line=0.2, solid=!$preview)
    makepoly(ldraw_lib__4125165fc01(), step=step, col=col, unit=unit, alt=alt, line=line, solid=solid);
ldraw_lib__4125165fc01(line=0.2);
